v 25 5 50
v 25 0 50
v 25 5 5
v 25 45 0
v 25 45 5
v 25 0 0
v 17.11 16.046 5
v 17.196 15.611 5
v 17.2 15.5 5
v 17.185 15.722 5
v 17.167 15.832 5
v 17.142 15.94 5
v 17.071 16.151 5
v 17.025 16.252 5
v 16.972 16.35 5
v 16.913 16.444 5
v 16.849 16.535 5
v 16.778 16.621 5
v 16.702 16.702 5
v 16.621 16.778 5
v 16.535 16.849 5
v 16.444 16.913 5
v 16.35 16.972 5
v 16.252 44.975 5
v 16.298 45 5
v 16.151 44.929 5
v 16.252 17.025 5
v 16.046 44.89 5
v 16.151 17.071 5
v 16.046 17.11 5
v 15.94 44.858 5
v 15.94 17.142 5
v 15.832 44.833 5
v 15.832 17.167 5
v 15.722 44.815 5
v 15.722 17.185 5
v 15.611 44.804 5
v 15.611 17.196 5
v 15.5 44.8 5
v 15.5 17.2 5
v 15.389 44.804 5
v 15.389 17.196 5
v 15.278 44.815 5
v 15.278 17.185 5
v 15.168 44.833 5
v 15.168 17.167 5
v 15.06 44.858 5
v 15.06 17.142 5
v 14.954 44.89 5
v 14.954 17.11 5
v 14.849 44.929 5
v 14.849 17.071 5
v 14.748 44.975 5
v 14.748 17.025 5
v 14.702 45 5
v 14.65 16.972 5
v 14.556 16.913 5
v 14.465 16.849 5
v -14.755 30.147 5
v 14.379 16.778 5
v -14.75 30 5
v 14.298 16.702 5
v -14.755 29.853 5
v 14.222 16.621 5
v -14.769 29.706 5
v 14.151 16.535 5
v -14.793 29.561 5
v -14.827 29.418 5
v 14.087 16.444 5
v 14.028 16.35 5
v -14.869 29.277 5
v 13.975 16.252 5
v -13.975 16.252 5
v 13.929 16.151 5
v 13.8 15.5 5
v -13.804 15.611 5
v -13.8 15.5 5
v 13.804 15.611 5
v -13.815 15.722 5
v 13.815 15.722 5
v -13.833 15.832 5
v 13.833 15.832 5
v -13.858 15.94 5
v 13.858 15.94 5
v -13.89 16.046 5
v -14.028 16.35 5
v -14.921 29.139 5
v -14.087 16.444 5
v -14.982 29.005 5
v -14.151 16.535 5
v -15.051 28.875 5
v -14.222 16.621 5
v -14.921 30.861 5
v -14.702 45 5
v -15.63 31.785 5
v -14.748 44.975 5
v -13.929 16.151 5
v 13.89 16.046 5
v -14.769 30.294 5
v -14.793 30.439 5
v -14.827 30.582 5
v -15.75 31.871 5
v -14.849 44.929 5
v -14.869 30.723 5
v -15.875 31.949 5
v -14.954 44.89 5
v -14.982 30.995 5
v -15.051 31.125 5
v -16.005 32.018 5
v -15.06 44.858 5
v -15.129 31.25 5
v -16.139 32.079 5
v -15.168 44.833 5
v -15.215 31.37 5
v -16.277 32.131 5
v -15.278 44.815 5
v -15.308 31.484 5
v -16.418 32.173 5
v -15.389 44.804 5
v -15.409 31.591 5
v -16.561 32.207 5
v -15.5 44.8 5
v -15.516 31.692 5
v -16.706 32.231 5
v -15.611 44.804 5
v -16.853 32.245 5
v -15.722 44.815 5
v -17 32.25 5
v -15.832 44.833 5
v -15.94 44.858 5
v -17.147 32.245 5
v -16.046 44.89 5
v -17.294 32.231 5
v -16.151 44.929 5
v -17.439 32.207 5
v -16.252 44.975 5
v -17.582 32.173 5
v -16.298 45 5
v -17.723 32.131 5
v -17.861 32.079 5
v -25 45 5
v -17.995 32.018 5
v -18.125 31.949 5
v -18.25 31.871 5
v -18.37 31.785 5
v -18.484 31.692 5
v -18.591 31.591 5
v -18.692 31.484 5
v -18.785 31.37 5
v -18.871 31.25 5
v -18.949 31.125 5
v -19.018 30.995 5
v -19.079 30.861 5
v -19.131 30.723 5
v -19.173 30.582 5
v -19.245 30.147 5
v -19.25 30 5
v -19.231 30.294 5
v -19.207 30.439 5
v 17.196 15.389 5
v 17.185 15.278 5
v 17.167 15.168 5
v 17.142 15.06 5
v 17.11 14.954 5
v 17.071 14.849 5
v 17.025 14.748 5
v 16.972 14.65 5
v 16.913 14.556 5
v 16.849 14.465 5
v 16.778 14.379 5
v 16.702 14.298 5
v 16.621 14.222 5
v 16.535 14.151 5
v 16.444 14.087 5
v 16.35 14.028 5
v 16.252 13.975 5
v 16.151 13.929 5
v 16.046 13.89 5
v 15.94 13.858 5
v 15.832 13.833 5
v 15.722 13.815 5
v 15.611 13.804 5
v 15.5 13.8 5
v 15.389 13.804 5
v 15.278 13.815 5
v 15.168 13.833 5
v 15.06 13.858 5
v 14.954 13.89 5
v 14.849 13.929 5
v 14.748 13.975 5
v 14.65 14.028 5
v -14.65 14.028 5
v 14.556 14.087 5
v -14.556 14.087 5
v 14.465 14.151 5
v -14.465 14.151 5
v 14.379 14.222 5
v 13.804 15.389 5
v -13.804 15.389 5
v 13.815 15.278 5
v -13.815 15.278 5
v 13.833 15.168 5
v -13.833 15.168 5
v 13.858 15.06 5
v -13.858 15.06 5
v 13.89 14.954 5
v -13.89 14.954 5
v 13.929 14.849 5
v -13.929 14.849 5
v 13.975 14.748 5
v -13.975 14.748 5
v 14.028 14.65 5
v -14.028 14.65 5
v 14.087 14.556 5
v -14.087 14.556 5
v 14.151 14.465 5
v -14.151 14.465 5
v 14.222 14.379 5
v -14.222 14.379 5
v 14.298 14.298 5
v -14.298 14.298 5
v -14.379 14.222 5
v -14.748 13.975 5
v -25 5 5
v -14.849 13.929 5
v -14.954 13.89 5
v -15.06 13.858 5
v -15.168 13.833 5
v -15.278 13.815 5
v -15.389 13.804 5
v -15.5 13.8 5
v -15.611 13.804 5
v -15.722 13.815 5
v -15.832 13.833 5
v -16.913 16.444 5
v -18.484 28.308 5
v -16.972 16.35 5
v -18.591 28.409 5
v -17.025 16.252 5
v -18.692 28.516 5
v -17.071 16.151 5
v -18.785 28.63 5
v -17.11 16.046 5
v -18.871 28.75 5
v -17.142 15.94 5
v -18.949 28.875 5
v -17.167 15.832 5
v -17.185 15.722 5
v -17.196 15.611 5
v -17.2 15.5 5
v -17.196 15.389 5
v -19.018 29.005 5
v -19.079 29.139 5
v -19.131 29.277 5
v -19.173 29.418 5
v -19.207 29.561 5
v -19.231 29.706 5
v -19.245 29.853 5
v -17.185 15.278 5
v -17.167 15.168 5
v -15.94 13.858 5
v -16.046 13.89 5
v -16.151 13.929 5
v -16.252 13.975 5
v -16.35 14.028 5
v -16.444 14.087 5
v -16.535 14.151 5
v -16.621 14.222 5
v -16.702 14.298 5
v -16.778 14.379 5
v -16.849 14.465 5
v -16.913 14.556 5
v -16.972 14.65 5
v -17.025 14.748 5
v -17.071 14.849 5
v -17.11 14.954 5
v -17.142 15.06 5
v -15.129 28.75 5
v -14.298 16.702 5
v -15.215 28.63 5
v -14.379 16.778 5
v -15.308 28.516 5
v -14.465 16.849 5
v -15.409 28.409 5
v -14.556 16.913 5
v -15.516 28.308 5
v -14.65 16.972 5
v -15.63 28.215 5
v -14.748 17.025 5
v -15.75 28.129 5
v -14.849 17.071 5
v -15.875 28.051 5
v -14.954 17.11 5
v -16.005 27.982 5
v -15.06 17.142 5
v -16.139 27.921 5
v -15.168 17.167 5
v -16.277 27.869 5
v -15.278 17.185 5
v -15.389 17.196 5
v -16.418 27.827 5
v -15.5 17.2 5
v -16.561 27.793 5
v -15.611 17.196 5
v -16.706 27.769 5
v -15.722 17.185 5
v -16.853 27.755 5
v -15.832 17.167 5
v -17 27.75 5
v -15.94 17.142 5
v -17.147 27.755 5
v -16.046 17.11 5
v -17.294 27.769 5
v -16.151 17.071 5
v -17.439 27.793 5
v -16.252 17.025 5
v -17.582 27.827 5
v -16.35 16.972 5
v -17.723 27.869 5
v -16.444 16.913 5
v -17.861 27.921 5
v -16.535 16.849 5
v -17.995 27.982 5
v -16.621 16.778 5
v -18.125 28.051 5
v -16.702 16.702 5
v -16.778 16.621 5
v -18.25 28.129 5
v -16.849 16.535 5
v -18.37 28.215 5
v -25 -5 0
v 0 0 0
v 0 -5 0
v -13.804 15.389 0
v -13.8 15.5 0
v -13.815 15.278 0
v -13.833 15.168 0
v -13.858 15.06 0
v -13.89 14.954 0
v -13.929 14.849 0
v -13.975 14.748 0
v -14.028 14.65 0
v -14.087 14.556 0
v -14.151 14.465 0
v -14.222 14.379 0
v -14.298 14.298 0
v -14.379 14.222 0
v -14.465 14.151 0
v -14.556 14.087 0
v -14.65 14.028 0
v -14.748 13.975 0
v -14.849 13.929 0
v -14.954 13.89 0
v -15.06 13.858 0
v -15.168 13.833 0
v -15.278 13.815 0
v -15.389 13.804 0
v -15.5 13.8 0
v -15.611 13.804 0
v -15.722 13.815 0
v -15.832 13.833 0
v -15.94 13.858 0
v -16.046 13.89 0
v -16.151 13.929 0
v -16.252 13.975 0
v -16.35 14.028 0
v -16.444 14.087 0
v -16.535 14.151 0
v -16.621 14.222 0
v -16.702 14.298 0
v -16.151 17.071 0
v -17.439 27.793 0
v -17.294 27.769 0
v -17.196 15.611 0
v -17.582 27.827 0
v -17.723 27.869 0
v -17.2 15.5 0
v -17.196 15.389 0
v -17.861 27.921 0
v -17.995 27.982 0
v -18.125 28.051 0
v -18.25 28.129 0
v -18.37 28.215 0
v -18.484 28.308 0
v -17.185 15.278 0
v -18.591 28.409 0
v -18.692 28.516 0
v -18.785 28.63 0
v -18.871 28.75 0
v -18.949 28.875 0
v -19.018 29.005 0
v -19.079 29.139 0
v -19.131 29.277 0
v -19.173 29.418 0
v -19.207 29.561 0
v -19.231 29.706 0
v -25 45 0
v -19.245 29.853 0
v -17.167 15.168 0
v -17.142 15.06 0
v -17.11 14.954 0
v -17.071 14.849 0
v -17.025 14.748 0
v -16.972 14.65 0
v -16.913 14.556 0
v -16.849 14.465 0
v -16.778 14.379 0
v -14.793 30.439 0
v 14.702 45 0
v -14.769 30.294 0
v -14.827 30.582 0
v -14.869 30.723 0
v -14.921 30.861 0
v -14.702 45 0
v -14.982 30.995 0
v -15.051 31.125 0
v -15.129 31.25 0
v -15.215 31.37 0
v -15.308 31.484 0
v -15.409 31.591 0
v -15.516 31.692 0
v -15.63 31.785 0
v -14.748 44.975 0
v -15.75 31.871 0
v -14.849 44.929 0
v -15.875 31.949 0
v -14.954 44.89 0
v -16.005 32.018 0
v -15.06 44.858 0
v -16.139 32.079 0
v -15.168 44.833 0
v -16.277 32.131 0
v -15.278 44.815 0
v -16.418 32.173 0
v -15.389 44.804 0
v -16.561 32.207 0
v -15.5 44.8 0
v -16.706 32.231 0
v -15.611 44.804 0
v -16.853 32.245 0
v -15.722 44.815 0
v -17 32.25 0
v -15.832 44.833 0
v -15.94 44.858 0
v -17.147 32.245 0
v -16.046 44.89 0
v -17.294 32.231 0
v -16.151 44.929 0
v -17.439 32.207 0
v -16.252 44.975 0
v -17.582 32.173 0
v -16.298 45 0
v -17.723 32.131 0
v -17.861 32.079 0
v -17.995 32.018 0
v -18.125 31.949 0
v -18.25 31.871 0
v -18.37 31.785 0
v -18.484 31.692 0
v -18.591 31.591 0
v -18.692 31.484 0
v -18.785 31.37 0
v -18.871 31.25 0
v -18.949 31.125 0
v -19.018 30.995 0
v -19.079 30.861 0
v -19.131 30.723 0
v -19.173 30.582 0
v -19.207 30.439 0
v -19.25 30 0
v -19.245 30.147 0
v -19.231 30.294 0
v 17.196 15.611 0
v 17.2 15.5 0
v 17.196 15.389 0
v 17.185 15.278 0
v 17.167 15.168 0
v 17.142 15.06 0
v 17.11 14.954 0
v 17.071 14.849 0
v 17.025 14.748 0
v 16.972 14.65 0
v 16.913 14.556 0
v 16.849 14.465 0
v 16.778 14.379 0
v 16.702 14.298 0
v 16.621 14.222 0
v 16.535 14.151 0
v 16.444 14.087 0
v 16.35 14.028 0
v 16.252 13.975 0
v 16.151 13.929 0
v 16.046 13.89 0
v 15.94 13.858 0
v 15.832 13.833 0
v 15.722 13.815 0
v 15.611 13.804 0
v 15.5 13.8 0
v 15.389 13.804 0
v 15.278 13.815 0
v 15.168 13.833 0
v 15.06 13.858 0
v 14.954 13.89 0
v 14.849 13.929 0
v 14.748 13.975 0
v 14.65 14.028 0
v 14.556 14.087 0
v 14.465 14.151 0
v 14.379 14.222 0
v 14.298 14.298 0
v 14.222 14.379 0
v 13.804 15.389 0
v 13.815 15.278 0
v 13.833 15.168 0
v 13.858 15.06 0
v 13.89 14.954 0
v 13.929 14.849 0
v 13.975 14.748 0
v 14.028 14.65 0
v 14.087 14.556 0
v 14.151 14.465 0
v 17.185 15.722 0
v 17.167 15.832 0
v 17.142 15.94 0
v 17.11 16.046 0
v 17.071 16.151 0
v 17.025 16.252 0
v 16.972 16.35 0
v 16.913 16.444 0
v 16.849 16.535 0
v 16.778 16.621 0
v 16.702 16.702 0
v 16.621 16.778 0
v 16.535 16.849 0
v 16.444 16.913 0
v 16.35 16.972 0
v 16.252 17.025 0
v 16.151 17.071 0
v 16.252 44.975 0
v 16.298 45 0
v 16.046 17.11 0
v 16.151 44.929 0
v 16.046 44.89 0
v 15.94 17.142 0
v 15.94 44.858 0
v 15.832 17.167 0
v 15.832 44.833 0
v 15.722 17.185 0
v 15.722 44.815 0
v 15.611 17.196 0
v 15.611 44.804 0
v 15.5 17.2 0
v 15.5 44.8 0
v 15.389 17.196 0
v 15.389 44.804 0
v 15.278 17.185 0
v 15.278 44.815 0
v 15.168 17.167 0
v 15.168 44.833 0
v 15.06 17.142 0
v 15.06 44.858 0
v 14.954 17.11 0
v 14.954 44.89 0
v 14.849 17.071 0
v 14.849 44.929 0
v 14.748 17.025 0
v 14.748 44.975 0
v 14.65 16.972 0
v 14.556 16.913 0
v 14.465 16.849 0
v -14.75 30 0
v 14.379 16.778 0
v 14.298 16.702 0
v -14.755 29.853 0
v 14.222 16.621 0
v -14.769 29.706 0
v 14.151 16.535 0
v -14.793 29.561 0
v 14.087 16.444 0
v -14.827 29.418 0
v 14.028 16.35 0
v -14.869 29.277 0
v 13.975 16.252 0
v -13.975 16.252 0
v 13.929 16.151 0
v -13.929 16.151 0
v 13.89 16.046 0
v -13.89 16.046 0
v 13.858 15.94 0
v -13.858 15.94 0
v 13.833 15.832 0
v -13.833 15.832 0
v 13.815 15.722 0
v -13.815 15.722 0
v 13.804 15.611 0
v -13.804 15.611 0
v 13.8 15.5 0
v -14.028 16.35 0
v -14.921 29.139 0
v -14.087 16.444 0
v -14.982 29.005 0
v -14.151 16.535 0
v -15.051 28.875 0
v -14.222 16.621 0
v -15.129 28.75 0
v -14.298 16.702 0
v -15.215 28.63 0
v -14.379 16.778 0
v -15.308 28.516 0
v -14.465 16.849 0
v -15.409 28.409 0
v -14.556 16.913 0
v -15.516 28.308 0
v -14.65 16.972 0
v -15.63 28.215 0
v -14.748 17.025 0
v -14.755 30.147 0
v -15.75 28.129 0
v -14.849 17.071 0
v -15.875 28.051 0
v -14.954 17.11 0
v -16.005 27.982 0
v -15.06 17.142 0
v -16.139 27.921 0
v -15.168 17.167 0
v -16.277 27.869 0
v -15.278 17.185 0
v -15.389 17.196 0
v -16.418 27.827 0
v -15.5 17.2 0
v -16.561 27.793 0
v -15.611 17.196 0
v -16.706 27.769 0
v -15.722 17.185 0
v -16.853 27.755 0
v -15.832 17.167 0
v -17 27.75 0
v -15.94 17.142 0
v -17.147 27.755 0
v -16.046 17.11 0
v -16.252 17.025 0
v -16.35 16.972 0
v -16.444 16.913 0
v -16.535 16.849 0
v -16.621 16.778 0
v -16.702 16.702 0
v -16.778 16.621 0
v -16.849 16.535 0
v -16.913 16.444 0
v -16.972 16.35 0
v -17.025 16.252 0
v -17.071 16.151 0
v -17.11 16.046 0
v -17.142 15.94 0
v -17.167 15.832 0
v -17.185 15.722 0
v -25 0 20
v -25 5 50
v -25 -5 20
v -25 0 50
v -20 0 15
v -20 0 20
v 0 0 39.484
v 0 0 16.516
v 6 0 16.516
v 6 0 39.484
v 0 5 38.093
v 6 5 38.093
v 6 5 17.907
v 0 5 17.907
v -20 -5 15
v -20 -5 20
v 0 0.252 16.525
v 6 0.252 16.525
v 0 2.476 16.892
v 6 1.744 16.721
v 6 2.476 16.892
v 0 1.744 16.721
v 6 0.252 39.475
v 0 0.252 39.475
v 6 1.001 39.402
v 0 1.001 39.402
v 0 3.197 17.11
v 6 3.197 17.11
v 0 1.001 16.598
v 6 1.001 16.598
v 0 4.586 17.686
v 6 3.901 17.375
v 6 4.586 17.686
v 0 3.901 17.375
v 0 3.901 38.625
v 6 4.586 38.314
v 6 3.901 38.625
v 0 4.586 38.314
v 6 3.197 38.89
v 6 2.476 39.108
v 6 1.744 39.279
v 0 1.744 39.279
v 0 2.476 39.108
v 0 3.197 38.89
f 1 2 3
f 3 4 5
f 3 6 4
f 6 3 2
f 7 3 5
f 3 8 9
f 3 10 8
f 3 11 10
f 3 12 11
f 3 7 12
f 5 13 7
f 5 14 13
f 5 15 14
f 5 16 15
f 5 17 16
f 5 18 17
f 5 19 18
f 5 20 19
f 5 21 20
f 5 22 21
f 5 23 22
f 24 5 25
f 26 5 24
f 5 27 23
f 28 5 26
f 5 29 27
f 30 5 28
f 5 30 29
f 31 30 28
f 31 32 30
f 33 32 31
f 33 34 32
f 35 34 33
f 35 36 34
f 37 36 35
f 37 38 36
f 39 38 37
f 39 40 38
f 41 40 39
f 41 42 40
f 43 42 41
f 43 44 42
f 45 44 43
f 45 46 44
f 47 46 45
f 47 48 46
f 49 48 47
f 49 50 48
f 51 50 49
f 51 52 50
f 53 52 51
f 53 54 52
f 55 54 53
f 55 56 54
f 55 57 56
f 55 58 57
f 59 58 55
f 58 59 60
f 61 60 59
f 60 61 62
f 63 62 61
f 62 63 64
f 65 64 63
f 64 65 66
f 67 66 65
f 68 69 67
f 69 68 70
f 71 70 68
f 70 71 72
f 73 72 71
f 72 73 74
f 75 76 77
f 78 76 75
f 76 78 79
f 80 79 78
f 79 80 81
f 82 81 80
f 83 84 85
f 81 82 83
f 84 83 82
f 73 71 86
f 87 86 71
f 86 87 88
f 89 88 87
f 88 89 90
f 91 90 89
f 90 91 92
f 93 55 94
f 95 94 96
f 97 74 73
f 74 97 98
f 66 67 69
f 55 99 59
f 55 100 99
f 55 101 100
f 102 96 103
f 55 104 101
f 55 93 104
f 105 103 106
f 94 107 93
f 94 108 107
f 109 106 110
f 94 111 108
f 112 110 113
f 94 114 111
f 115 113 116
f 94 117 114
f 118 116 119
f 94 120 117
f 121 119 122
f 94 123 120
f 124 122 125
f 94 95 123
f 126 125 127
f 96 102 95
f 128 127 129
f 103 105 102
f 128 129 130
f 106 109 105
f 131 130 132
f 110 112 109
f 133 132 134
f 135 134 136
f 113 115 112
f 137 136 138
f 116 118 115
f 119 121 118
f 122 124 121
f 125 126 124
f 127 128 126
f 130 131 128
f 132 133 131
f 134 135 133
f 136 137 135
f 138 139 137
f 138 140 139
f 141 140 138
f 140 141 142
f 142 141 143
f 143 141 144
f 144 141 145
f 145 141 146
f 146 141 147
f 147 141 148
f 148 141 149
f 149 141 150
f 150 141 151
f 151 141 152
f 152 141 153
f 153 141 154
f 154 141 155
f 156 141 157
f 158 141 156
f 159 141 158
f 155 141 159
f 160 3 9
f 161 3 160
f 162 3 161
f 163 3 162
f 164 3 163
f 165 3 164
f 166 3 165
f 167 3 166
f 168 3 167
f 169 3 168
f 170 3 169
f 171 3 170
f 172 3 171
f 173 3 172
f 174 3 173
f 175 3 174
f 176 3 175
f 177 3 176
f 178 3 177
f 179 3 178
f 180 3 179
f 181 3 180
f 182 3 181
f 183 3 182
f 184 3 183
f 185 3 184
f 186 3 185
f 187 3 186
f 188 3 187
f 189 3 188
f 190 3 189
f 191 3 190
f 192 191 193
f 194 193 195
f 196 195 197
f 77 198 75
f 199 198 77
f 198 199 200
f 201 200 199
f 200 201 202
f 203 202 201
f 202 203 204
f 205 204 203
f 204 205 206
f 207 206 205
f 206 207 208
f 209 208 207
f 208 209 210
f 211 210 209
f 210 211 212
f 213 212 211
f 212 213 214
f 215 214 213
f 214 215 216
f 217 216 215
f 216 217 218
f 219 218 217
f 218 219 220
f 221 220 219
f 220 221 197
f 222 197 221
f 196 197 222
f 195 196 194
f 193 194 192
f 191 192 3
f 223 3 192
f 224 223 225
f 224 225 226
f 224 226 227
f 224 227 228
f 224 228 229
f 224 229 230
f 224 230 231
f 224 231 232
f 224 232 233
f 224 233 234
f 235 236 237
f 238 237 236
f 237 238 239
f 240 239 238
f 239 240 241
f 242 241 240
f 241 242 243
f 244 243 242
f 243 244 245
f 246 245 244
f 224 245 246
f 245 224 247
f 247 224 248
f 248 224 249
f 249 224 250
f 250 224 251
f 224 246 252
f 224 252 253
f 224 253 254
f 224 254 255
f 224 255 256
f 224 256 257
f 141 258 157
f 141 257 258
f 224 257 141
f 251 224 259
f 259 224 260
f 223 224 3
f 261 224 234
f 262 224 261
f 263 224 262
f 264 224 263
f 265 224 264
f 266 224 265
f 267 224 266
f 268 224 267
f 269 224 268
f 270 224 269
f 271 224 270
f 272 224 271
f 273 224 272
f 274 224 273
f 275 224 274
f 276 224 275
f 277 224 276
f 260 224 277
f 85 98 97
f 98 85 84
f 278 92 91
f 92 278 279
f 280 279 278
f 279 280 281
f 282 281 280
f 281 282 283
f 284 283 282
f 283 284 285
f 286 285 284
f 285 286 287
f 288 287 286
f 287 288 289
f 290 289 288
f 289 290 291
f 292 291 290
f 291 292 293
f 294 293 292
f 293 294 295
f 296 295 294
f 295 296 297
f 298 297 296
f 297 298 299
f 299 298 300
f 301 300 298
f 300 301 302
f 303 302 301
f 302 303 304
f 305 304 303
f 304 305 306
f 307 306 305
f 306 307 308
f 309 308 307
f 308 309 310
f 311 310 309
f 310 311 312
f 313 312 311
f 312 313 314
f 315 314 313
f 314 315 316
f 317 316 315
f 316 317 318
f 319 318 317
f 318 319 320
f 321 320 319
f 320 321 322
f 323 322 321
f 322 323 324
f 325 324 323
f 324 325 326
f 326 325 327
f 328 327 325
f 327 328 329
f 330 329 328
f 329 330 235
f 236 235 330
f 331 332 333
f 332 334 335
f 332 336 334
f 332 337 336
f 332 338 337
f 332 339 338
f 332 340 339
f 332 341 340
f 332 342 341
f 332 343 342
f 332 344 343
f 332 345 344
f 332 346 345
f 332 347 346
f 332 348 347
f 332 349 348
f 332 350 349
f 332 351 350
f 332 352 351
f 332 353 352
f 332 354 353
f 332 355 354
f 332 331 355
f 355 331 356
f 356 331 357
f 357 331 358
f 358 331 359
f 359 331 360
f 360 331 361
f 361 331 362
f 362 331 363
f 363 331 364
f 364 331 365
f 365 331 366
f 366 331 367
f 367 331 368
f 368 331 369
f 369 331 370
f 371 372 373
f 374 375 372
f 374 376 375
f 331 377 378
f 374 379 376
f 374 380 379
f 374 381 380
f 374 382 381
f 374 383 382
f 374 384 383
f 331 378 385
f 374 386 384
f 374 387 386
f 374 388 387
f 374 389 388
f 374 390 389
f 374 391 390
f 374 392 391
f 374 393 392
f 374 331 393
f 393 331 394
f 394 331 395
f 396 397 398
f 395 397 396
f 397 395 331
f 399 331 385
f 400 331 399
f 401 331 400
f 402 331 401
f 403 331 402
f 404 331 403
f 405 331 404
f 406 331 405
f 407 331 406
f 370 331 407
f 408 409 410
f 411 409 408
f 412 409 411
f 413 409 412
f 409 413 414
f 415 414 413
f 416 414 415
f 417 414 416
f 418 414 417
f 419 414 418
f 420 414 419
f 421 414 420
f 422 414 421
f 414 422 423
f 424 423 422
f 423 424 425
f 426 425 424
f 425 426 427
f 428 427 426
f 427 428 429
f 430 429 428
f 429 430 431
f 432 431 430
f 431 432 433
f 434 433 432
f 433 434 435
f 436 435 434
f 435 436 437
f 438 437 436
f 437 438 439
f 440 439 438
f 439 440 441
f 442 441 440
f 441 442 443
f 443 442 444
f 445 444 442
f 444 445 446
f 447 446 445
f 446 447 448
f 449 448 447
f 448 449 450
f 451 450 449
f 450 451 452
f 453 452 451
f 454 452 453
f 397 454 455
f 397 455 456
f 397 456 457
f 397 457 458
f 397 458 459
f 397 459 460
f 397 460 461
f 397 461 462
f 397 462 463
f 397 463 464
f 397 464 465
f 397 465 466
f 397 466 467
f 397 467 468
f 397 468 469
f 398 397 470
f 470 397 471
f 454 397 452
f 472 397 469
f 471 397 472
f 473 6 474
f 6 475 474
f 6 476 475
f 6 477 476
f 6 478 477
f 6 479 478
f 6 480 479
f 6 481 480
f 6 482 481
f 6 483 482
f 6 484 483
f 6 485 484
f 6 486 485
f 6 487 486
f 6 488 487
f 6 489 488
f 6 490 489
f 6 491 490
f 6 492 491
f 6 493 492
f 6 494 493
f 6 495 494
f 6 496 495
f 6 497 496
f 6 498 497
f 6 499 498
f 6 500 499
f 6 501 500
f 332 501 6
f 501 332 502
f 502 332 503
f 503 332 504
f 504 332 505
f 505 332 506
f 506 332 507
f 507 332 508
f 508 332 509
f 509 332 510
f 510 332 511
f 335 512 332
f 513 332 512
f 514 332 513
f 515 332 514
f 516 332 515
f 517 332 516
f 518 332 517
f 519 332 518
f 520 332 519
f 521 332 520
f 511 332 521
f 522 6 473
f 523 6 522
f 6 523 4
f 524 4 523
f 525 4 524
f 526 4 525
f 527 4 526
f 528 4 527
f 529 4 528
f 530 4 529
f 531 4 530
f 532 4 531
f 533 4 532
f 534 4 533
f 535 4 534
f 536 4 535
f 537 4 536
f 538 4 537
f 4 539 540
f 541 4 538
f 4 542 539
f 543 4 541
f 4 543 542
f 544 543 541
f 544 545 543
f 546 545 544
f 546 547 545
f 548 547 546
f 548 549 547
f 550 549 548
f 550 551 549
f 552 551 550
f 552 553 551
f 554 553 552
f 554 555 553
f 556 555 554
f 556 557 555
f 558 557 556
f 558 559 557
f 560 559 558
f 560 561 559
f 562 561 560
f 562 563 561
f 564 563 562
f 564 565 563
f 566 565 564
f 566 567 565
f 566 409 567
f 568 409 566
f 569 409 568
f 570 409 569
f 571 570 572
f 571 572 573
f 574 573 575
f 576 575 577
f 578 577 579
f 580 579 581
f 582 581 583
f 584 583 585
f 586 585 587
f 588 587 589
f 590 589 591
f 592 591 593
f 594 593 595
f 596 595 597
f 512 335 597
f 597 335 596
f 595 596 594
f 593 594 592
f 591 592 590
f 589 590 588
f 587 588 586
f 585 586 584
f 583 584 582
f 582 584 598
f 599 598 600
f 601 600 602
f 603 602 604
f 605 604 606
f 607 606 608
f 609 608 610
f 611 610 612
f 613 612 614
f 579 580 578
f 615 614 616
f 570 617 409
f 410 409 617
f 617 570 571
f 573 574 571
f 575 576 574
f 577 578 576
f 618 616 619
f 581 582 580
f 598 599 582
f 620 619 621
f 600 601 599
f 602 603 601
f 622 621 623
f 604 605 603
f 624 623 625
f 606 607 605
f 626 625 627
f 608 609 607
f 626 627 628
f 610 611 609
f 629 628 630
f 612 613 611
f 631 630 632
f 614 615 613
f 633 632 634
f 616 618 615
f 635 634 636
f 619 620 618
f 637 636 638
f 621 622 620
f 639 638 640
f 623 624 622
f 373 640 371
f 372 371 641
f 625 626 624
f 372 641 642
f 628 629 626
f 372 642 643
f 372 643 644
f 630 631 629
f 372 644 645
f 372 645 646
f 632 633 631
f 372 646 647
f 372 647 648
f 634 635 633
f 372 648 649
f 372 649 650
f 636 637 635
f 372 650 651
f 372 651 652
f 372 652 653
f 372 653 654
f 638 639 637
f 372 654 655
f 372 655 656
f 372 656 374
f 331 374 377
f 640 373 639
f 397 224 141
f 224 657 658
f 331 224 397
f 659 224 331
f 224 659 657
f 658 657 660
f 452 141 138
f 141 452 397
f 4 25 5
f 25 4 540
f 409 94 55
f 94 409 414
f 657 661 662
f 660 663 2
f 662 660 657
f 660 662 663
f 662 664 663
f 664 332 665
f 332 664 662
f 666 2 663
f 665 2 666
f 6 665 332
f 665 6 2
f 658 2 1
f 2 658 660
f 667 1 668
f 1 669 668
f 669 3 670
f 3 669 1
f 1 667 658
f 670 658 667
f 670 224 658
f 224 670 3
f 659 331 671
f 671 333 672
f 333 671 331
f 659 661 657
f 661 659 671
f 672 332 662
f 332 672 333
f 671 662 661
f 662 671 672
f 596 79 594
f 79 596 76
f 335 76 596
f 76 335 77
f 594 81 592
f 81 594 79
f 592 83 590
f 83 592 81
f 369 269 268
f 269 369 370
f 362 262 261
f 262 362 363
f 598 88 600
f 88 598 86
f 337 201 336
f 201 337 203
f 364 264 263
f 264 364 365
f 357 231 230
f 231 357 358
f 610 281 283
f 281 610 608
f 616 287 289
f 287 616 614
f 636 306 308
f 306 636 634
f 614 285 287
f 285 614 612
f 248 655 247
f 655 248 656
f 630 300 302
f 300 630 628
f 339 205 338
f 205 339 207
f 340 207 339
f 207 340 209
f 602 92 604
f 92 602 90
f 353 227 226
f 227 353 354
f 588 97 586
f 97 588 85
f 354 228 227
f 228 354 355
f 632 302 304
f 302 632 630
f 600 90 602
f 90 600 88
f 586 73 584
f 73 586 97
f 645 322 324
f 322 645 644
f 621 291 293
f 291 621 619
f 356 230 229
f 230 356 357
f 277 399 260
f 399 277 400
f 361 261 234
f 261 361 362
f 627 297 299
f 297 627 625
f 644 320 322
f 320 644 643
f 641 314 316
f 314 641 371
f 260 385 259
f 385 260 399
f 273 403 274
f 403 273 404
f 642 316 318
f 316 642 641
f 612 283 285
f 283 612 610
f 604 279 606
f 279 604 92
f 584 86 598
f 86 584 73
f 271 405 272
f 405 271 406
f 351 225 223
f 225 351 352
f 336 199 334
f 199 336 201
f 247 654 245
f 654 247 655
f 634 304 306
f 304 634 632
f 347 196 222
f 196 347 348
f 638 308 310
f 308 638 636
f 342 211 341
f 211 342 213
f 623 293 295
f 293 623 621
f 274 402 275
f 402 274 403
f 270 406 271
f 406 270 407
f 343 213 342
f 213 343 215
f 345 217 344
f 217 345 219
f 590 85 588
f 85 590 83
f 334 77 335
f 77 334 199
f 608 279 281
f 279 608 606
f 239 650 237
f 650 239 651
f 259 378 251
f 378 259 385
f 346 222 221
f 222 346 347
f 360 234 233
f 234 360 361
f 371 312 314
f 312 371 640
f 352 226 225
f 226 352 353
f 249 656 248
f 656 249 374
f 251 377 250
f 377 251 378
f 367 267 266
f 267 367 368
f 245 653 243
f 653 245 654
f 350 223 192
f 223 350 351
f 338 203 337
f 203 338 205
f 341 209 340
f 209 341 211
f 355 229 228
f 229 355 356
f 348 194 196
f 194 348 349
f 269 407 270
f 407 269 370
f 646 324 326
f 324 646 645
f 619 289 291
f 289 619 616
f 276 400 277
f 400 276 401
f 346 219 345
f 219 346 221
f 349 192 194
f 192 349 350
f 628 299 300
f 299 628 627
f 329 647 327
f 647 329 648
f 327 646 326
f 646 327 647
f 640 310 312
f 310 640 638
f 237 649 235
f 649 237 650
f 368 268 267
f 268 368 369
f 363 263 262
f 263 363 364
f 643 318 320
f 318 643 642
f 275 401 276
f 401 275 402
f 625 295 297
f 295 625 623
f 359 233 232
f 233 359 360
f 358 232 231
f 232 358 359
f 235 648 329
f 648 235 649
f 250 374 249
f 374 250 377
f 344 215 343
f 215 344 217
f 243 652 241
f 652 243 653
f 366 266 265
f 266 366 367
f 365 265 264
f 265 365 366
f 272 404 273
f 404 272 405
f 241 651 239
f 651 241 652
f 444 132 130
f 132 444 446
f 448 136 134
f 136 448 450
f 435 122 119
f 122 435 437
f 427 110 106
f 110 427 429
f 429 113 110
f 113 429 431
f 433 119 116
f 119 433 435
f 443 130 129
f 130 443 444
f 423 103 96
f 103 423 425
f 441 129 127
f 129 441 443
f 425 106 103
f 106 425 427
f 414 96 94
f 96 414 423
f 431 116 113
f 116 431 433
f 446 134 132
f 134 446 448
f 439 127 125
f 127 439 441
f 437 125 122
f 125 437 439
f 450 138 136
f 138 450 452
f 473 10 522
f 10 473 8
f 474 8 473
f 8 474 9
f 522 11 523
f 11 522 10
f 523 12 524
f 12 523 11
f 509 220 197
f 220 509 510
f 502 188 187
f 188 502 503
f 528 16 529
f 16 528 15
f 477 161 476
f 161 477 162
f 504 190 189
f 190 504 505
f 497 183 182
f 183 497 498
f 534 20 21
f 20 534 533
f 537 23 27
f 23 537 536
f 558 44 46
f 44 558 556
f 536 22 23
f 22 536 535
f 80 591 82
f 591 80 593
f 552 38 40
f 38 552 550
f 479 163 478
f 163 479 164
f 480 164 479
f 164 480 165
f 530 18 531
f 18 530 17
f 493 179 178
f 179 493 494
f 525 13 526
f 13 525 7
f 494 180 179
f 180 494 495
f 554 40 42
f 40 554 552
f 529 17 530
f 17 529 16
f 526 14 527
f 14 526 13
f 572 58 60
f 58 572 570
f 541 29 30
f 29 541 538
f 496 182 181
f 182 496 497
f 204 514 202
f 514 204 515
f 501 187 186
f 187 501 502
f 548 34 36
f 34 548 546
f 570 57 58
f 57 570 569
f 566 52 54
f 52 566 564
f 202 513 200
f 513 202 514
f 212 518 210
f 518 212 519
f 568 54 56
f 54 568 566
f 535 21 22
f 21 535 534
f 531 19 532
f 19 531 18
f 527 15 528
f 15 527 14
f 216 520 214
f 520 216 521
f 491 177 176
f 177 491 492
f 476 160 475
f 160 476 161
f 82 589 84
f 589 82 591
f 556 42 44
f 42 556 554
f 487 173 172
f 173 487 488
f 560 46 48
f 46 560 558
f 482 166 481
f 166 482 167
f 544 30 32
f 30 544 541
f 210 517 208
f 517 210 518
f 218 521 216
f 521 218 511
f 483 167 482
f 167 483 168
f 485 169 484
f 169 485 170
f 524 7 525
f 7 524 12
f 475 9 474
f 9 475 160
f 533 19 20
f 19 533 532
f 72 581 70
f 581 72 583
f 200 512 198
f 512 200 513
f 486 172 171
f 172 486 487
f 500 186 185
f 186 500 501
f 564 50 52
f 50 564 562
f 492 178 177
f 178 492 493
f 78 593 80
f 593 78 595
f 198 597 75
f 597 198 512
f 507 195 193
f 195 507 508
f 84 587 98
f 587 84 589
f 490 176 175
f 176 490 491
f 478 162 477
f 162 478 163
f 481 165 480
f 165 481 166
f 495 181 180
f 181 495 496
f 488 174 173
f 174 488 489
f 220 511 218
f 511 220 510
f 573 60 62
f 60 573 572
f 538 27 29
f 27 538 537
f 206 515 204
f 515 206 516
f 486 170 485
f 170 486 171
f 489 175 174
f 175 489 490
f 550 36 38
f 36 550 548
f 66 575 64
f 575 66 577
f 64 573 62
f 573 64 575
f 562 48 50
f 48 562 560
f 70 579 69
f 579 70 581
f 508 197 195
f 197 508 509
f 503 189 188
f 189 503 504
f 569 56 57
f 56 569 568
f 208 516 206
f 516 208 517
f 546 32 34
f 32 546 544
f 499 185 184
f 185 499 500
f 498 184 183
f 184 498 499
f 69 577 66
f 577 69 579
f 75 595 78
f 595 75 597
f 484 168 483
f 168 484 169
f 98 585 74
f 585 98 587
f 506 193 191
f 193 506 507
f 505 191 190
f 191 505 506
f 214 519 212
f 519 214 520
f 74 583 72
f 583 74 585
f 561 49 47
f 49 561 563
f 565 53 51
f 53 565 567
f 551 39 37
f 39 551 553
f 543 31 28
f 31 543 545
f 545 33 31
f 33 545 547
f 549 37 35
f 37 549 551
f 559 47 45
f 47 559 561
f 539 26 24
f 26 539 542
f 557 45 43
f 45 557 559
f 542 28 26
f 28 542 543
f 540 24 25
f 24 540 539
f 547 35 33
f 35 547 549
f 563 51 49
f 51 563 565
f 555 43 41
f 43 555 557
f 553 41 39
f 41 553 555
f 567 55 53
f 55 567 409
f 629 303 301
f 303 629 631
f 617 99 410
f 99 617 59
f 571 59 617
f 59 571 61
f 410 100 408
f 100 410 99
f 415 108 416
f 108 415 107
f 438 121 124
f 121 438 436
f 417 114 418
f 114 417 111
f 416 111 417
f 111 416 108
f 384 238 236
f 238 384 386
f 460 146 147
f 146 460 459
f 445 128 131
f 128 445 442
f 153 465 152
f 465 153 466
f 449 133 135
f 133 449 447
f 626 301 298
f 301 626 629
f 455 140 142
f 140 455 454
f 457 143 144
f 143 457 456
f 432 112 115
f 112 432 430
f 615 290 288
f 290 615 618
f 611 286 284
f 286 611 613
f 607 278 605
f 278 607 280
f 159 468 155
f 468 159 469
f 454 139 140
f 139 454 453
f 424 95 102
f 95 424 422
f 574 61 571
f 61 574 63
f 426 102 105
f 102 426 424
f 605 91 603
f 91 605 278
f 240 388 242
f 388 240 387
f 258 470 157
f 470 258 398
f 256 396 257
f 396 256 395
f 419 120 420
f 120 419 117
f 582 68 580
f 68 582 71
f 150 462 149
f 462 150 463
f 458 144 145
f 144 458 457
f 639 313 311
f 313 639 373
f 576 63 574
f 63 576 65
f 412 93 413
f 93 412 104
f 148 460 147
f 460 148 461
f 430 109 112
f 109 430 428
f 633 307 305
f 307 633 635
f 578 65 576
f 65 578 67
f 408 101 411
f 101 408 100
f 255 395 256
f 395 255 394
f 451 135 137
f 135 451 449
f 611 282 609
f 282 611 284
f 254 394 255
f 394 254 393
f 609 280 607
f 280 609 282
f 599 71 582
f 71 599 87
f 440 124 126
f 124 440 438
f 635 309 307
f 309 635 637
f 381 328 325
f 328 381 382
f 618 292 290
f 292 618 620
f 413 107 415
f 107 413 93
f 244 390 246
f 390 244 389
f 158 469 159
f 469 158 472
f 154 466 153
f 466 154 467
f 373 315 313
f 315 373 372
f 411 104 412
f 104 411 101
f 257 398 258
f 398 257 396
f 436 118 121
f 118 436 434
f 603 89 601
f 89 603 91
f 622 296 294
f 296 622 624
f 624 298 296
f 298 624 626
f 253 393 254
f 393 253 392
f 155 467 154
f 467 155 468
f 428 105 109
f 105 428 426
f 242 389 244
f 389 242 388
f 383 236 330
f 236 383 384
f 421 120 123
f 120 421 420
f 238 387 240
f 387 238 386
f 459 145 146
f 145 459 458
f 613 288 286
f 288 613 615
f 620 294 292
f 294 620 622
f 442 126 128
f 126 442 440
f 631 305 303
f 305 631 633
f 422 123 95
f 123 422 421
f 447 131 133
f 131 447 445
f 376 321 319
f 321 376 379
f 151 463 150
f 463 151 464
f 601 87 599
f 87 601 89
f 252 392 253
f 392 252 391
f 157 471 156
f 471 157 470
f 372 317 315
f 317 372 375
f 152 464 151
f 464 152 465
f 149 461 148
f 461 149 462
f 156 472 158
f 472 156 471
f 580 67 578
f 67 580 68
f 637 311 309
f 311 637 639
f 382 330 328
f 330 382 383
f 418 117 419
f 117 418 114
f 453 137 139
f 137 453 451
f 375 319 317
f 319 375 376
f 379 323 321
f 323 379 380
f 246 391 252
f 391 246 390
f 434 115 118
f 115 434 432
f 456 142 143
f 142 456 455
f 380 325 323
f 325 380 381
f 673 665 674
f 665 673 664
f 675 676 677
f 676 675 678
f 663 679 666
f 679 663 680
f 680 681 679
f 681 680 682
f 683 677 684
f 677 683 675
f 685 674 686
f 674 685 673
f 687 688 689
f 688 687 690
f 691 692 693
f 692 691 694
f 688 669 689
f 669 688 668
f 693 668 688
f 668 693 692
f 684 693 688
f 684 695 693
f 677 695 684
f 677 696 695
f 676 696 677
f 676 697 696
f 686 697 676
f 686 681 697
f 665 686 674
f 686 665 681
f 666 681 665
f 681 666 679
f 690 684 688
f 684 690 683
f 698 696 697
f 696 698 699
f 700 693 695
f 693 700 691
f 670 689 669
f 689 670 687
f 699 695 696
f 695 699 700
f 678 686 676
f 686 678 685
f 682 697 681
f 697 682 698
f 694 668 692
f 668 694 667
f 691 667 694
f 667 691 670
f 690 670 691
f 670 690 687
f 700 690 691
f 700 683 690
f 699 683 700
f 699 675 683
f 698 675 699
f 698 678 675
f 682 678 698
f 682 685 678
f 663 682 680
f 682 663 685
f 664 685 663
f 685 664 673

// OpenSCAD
// L-shaped mounting bracket for NEMA 17 stepper motor
// Print orientation: base plate on bed (z = 0), motor plate builds upward (+Z)

// ---------------- Parameters ----------------
base_x0      = -25;    // base plate: x start
base_x1      = 25;     // base plate: x end
base_y0      = 0;      // base plate: y start
base_y1      = 45;     // base plate: y end
base_z0      = 0;      // base plate: z start
base_z1      = 5;      // base plate: z end

hole_x       = -17;    // M4 through-hole x position
hole_y       = 30;     // M4 through-hole y position
hole_d       = 4.5;    // M4 hole diameter

plate_x0     = -25;    // motor plate: x start
plate_x1     = 25;     // motor plate: x end
plate_y0     = 0;      // motor plate: y start
plate_y1     = 5;      // motor plate: y end (on back edge of base)
plate_z0     = 0;      // motor plate: z start
plate_z1     = 50;     // motor plate: z end

boss_d       = 23;     // motor centring boss hole diameter
boss_x       = 0;      // boss hole centre x
boss_z       = 28;     // boss hole centre z

screw_d      = 3.4;    // M3 screw hole diameter
screw_nx     = 4;      // number of screw holes (square pattern)
screw_pitch  = 31;     // square pattern side length

gusset_t     = 5;      // gusset thickness (X direction)
gusset_y     = 20;     // gusset leg length along +Y
gusset_z     = 20;     // gusset leg length along +Z
gusset_x0    = -25;    // left gusset x start
gusset_x1    = -20;    // left gusset x end

eps          = 0.5;    // cutter overshoot past faces

$fn = 96;

// ---------------- Model ----------------
difference() {
    union() {
        // Base plate
        translate([base_x0, base_y0, base_z0])
            cube([base_x1 - base_x0, base_y1 - base_y0, base_z1 - base_z0]);

        // Motor plate
        translate([plate_x0, plate_y0, plate_z0])
            cube([plate_x1 - plate_x0, plate_y1 - plate_y0, plate_z1 - plate_z0]);

        // Left gusset (right triangle in YZ, right angle at y=5, z=5)
        translate([gusset_x0, 0, 0])
            rotate([90, 0, 0])
                linear_extrude(height = gusset_t)
                    polygon(points = [
                        [0, 0],
                        [gusset_y, 0],
                        [0, gusset_z]
                    ]);

        // Right gusset (right triangle in YZ, right angle at y=5, z=5)
        translate([gusset_x1, 0, 0])
            rotate([90, 0, 0])
                linear_extrude(height = gusset_t)
                    polygon(points = [
                        [0, 0],
                        [gusset_y, 0],
                        [0, gusset_z]
                    ]);
    }

    // M4 through-holes in base plate
    translate([hole_x, hole_y, -eps])
        cylinder(d = hole_d, h = base_z1 - base_z0 + 2 * eps);

    // Motor boss hole through motor plate (along Y)
    translate([boss_x, plate_y0 - eps, boss_z])
        rotate([0, 90, 0])
            cylinder(d = boss_d, h = plate_y1 - plate_y0 + 2 * eps);

    // M3 screw holes on square pattern centred on boss hole
    for (i = [0 : screw_nx - 1]) {
        for (j = [0 : screw_nx - 1]) {
            translate([(i - (screw_nx - 1) / 2) * screw_pitch,
                       (j - (screw_nx - 1) / 2) * screw_pitch,
                       -eps])
                cylinder(d = screw_d, h = plate_z1 - plate_z0 + 2 * eps);
        }
    }
}
